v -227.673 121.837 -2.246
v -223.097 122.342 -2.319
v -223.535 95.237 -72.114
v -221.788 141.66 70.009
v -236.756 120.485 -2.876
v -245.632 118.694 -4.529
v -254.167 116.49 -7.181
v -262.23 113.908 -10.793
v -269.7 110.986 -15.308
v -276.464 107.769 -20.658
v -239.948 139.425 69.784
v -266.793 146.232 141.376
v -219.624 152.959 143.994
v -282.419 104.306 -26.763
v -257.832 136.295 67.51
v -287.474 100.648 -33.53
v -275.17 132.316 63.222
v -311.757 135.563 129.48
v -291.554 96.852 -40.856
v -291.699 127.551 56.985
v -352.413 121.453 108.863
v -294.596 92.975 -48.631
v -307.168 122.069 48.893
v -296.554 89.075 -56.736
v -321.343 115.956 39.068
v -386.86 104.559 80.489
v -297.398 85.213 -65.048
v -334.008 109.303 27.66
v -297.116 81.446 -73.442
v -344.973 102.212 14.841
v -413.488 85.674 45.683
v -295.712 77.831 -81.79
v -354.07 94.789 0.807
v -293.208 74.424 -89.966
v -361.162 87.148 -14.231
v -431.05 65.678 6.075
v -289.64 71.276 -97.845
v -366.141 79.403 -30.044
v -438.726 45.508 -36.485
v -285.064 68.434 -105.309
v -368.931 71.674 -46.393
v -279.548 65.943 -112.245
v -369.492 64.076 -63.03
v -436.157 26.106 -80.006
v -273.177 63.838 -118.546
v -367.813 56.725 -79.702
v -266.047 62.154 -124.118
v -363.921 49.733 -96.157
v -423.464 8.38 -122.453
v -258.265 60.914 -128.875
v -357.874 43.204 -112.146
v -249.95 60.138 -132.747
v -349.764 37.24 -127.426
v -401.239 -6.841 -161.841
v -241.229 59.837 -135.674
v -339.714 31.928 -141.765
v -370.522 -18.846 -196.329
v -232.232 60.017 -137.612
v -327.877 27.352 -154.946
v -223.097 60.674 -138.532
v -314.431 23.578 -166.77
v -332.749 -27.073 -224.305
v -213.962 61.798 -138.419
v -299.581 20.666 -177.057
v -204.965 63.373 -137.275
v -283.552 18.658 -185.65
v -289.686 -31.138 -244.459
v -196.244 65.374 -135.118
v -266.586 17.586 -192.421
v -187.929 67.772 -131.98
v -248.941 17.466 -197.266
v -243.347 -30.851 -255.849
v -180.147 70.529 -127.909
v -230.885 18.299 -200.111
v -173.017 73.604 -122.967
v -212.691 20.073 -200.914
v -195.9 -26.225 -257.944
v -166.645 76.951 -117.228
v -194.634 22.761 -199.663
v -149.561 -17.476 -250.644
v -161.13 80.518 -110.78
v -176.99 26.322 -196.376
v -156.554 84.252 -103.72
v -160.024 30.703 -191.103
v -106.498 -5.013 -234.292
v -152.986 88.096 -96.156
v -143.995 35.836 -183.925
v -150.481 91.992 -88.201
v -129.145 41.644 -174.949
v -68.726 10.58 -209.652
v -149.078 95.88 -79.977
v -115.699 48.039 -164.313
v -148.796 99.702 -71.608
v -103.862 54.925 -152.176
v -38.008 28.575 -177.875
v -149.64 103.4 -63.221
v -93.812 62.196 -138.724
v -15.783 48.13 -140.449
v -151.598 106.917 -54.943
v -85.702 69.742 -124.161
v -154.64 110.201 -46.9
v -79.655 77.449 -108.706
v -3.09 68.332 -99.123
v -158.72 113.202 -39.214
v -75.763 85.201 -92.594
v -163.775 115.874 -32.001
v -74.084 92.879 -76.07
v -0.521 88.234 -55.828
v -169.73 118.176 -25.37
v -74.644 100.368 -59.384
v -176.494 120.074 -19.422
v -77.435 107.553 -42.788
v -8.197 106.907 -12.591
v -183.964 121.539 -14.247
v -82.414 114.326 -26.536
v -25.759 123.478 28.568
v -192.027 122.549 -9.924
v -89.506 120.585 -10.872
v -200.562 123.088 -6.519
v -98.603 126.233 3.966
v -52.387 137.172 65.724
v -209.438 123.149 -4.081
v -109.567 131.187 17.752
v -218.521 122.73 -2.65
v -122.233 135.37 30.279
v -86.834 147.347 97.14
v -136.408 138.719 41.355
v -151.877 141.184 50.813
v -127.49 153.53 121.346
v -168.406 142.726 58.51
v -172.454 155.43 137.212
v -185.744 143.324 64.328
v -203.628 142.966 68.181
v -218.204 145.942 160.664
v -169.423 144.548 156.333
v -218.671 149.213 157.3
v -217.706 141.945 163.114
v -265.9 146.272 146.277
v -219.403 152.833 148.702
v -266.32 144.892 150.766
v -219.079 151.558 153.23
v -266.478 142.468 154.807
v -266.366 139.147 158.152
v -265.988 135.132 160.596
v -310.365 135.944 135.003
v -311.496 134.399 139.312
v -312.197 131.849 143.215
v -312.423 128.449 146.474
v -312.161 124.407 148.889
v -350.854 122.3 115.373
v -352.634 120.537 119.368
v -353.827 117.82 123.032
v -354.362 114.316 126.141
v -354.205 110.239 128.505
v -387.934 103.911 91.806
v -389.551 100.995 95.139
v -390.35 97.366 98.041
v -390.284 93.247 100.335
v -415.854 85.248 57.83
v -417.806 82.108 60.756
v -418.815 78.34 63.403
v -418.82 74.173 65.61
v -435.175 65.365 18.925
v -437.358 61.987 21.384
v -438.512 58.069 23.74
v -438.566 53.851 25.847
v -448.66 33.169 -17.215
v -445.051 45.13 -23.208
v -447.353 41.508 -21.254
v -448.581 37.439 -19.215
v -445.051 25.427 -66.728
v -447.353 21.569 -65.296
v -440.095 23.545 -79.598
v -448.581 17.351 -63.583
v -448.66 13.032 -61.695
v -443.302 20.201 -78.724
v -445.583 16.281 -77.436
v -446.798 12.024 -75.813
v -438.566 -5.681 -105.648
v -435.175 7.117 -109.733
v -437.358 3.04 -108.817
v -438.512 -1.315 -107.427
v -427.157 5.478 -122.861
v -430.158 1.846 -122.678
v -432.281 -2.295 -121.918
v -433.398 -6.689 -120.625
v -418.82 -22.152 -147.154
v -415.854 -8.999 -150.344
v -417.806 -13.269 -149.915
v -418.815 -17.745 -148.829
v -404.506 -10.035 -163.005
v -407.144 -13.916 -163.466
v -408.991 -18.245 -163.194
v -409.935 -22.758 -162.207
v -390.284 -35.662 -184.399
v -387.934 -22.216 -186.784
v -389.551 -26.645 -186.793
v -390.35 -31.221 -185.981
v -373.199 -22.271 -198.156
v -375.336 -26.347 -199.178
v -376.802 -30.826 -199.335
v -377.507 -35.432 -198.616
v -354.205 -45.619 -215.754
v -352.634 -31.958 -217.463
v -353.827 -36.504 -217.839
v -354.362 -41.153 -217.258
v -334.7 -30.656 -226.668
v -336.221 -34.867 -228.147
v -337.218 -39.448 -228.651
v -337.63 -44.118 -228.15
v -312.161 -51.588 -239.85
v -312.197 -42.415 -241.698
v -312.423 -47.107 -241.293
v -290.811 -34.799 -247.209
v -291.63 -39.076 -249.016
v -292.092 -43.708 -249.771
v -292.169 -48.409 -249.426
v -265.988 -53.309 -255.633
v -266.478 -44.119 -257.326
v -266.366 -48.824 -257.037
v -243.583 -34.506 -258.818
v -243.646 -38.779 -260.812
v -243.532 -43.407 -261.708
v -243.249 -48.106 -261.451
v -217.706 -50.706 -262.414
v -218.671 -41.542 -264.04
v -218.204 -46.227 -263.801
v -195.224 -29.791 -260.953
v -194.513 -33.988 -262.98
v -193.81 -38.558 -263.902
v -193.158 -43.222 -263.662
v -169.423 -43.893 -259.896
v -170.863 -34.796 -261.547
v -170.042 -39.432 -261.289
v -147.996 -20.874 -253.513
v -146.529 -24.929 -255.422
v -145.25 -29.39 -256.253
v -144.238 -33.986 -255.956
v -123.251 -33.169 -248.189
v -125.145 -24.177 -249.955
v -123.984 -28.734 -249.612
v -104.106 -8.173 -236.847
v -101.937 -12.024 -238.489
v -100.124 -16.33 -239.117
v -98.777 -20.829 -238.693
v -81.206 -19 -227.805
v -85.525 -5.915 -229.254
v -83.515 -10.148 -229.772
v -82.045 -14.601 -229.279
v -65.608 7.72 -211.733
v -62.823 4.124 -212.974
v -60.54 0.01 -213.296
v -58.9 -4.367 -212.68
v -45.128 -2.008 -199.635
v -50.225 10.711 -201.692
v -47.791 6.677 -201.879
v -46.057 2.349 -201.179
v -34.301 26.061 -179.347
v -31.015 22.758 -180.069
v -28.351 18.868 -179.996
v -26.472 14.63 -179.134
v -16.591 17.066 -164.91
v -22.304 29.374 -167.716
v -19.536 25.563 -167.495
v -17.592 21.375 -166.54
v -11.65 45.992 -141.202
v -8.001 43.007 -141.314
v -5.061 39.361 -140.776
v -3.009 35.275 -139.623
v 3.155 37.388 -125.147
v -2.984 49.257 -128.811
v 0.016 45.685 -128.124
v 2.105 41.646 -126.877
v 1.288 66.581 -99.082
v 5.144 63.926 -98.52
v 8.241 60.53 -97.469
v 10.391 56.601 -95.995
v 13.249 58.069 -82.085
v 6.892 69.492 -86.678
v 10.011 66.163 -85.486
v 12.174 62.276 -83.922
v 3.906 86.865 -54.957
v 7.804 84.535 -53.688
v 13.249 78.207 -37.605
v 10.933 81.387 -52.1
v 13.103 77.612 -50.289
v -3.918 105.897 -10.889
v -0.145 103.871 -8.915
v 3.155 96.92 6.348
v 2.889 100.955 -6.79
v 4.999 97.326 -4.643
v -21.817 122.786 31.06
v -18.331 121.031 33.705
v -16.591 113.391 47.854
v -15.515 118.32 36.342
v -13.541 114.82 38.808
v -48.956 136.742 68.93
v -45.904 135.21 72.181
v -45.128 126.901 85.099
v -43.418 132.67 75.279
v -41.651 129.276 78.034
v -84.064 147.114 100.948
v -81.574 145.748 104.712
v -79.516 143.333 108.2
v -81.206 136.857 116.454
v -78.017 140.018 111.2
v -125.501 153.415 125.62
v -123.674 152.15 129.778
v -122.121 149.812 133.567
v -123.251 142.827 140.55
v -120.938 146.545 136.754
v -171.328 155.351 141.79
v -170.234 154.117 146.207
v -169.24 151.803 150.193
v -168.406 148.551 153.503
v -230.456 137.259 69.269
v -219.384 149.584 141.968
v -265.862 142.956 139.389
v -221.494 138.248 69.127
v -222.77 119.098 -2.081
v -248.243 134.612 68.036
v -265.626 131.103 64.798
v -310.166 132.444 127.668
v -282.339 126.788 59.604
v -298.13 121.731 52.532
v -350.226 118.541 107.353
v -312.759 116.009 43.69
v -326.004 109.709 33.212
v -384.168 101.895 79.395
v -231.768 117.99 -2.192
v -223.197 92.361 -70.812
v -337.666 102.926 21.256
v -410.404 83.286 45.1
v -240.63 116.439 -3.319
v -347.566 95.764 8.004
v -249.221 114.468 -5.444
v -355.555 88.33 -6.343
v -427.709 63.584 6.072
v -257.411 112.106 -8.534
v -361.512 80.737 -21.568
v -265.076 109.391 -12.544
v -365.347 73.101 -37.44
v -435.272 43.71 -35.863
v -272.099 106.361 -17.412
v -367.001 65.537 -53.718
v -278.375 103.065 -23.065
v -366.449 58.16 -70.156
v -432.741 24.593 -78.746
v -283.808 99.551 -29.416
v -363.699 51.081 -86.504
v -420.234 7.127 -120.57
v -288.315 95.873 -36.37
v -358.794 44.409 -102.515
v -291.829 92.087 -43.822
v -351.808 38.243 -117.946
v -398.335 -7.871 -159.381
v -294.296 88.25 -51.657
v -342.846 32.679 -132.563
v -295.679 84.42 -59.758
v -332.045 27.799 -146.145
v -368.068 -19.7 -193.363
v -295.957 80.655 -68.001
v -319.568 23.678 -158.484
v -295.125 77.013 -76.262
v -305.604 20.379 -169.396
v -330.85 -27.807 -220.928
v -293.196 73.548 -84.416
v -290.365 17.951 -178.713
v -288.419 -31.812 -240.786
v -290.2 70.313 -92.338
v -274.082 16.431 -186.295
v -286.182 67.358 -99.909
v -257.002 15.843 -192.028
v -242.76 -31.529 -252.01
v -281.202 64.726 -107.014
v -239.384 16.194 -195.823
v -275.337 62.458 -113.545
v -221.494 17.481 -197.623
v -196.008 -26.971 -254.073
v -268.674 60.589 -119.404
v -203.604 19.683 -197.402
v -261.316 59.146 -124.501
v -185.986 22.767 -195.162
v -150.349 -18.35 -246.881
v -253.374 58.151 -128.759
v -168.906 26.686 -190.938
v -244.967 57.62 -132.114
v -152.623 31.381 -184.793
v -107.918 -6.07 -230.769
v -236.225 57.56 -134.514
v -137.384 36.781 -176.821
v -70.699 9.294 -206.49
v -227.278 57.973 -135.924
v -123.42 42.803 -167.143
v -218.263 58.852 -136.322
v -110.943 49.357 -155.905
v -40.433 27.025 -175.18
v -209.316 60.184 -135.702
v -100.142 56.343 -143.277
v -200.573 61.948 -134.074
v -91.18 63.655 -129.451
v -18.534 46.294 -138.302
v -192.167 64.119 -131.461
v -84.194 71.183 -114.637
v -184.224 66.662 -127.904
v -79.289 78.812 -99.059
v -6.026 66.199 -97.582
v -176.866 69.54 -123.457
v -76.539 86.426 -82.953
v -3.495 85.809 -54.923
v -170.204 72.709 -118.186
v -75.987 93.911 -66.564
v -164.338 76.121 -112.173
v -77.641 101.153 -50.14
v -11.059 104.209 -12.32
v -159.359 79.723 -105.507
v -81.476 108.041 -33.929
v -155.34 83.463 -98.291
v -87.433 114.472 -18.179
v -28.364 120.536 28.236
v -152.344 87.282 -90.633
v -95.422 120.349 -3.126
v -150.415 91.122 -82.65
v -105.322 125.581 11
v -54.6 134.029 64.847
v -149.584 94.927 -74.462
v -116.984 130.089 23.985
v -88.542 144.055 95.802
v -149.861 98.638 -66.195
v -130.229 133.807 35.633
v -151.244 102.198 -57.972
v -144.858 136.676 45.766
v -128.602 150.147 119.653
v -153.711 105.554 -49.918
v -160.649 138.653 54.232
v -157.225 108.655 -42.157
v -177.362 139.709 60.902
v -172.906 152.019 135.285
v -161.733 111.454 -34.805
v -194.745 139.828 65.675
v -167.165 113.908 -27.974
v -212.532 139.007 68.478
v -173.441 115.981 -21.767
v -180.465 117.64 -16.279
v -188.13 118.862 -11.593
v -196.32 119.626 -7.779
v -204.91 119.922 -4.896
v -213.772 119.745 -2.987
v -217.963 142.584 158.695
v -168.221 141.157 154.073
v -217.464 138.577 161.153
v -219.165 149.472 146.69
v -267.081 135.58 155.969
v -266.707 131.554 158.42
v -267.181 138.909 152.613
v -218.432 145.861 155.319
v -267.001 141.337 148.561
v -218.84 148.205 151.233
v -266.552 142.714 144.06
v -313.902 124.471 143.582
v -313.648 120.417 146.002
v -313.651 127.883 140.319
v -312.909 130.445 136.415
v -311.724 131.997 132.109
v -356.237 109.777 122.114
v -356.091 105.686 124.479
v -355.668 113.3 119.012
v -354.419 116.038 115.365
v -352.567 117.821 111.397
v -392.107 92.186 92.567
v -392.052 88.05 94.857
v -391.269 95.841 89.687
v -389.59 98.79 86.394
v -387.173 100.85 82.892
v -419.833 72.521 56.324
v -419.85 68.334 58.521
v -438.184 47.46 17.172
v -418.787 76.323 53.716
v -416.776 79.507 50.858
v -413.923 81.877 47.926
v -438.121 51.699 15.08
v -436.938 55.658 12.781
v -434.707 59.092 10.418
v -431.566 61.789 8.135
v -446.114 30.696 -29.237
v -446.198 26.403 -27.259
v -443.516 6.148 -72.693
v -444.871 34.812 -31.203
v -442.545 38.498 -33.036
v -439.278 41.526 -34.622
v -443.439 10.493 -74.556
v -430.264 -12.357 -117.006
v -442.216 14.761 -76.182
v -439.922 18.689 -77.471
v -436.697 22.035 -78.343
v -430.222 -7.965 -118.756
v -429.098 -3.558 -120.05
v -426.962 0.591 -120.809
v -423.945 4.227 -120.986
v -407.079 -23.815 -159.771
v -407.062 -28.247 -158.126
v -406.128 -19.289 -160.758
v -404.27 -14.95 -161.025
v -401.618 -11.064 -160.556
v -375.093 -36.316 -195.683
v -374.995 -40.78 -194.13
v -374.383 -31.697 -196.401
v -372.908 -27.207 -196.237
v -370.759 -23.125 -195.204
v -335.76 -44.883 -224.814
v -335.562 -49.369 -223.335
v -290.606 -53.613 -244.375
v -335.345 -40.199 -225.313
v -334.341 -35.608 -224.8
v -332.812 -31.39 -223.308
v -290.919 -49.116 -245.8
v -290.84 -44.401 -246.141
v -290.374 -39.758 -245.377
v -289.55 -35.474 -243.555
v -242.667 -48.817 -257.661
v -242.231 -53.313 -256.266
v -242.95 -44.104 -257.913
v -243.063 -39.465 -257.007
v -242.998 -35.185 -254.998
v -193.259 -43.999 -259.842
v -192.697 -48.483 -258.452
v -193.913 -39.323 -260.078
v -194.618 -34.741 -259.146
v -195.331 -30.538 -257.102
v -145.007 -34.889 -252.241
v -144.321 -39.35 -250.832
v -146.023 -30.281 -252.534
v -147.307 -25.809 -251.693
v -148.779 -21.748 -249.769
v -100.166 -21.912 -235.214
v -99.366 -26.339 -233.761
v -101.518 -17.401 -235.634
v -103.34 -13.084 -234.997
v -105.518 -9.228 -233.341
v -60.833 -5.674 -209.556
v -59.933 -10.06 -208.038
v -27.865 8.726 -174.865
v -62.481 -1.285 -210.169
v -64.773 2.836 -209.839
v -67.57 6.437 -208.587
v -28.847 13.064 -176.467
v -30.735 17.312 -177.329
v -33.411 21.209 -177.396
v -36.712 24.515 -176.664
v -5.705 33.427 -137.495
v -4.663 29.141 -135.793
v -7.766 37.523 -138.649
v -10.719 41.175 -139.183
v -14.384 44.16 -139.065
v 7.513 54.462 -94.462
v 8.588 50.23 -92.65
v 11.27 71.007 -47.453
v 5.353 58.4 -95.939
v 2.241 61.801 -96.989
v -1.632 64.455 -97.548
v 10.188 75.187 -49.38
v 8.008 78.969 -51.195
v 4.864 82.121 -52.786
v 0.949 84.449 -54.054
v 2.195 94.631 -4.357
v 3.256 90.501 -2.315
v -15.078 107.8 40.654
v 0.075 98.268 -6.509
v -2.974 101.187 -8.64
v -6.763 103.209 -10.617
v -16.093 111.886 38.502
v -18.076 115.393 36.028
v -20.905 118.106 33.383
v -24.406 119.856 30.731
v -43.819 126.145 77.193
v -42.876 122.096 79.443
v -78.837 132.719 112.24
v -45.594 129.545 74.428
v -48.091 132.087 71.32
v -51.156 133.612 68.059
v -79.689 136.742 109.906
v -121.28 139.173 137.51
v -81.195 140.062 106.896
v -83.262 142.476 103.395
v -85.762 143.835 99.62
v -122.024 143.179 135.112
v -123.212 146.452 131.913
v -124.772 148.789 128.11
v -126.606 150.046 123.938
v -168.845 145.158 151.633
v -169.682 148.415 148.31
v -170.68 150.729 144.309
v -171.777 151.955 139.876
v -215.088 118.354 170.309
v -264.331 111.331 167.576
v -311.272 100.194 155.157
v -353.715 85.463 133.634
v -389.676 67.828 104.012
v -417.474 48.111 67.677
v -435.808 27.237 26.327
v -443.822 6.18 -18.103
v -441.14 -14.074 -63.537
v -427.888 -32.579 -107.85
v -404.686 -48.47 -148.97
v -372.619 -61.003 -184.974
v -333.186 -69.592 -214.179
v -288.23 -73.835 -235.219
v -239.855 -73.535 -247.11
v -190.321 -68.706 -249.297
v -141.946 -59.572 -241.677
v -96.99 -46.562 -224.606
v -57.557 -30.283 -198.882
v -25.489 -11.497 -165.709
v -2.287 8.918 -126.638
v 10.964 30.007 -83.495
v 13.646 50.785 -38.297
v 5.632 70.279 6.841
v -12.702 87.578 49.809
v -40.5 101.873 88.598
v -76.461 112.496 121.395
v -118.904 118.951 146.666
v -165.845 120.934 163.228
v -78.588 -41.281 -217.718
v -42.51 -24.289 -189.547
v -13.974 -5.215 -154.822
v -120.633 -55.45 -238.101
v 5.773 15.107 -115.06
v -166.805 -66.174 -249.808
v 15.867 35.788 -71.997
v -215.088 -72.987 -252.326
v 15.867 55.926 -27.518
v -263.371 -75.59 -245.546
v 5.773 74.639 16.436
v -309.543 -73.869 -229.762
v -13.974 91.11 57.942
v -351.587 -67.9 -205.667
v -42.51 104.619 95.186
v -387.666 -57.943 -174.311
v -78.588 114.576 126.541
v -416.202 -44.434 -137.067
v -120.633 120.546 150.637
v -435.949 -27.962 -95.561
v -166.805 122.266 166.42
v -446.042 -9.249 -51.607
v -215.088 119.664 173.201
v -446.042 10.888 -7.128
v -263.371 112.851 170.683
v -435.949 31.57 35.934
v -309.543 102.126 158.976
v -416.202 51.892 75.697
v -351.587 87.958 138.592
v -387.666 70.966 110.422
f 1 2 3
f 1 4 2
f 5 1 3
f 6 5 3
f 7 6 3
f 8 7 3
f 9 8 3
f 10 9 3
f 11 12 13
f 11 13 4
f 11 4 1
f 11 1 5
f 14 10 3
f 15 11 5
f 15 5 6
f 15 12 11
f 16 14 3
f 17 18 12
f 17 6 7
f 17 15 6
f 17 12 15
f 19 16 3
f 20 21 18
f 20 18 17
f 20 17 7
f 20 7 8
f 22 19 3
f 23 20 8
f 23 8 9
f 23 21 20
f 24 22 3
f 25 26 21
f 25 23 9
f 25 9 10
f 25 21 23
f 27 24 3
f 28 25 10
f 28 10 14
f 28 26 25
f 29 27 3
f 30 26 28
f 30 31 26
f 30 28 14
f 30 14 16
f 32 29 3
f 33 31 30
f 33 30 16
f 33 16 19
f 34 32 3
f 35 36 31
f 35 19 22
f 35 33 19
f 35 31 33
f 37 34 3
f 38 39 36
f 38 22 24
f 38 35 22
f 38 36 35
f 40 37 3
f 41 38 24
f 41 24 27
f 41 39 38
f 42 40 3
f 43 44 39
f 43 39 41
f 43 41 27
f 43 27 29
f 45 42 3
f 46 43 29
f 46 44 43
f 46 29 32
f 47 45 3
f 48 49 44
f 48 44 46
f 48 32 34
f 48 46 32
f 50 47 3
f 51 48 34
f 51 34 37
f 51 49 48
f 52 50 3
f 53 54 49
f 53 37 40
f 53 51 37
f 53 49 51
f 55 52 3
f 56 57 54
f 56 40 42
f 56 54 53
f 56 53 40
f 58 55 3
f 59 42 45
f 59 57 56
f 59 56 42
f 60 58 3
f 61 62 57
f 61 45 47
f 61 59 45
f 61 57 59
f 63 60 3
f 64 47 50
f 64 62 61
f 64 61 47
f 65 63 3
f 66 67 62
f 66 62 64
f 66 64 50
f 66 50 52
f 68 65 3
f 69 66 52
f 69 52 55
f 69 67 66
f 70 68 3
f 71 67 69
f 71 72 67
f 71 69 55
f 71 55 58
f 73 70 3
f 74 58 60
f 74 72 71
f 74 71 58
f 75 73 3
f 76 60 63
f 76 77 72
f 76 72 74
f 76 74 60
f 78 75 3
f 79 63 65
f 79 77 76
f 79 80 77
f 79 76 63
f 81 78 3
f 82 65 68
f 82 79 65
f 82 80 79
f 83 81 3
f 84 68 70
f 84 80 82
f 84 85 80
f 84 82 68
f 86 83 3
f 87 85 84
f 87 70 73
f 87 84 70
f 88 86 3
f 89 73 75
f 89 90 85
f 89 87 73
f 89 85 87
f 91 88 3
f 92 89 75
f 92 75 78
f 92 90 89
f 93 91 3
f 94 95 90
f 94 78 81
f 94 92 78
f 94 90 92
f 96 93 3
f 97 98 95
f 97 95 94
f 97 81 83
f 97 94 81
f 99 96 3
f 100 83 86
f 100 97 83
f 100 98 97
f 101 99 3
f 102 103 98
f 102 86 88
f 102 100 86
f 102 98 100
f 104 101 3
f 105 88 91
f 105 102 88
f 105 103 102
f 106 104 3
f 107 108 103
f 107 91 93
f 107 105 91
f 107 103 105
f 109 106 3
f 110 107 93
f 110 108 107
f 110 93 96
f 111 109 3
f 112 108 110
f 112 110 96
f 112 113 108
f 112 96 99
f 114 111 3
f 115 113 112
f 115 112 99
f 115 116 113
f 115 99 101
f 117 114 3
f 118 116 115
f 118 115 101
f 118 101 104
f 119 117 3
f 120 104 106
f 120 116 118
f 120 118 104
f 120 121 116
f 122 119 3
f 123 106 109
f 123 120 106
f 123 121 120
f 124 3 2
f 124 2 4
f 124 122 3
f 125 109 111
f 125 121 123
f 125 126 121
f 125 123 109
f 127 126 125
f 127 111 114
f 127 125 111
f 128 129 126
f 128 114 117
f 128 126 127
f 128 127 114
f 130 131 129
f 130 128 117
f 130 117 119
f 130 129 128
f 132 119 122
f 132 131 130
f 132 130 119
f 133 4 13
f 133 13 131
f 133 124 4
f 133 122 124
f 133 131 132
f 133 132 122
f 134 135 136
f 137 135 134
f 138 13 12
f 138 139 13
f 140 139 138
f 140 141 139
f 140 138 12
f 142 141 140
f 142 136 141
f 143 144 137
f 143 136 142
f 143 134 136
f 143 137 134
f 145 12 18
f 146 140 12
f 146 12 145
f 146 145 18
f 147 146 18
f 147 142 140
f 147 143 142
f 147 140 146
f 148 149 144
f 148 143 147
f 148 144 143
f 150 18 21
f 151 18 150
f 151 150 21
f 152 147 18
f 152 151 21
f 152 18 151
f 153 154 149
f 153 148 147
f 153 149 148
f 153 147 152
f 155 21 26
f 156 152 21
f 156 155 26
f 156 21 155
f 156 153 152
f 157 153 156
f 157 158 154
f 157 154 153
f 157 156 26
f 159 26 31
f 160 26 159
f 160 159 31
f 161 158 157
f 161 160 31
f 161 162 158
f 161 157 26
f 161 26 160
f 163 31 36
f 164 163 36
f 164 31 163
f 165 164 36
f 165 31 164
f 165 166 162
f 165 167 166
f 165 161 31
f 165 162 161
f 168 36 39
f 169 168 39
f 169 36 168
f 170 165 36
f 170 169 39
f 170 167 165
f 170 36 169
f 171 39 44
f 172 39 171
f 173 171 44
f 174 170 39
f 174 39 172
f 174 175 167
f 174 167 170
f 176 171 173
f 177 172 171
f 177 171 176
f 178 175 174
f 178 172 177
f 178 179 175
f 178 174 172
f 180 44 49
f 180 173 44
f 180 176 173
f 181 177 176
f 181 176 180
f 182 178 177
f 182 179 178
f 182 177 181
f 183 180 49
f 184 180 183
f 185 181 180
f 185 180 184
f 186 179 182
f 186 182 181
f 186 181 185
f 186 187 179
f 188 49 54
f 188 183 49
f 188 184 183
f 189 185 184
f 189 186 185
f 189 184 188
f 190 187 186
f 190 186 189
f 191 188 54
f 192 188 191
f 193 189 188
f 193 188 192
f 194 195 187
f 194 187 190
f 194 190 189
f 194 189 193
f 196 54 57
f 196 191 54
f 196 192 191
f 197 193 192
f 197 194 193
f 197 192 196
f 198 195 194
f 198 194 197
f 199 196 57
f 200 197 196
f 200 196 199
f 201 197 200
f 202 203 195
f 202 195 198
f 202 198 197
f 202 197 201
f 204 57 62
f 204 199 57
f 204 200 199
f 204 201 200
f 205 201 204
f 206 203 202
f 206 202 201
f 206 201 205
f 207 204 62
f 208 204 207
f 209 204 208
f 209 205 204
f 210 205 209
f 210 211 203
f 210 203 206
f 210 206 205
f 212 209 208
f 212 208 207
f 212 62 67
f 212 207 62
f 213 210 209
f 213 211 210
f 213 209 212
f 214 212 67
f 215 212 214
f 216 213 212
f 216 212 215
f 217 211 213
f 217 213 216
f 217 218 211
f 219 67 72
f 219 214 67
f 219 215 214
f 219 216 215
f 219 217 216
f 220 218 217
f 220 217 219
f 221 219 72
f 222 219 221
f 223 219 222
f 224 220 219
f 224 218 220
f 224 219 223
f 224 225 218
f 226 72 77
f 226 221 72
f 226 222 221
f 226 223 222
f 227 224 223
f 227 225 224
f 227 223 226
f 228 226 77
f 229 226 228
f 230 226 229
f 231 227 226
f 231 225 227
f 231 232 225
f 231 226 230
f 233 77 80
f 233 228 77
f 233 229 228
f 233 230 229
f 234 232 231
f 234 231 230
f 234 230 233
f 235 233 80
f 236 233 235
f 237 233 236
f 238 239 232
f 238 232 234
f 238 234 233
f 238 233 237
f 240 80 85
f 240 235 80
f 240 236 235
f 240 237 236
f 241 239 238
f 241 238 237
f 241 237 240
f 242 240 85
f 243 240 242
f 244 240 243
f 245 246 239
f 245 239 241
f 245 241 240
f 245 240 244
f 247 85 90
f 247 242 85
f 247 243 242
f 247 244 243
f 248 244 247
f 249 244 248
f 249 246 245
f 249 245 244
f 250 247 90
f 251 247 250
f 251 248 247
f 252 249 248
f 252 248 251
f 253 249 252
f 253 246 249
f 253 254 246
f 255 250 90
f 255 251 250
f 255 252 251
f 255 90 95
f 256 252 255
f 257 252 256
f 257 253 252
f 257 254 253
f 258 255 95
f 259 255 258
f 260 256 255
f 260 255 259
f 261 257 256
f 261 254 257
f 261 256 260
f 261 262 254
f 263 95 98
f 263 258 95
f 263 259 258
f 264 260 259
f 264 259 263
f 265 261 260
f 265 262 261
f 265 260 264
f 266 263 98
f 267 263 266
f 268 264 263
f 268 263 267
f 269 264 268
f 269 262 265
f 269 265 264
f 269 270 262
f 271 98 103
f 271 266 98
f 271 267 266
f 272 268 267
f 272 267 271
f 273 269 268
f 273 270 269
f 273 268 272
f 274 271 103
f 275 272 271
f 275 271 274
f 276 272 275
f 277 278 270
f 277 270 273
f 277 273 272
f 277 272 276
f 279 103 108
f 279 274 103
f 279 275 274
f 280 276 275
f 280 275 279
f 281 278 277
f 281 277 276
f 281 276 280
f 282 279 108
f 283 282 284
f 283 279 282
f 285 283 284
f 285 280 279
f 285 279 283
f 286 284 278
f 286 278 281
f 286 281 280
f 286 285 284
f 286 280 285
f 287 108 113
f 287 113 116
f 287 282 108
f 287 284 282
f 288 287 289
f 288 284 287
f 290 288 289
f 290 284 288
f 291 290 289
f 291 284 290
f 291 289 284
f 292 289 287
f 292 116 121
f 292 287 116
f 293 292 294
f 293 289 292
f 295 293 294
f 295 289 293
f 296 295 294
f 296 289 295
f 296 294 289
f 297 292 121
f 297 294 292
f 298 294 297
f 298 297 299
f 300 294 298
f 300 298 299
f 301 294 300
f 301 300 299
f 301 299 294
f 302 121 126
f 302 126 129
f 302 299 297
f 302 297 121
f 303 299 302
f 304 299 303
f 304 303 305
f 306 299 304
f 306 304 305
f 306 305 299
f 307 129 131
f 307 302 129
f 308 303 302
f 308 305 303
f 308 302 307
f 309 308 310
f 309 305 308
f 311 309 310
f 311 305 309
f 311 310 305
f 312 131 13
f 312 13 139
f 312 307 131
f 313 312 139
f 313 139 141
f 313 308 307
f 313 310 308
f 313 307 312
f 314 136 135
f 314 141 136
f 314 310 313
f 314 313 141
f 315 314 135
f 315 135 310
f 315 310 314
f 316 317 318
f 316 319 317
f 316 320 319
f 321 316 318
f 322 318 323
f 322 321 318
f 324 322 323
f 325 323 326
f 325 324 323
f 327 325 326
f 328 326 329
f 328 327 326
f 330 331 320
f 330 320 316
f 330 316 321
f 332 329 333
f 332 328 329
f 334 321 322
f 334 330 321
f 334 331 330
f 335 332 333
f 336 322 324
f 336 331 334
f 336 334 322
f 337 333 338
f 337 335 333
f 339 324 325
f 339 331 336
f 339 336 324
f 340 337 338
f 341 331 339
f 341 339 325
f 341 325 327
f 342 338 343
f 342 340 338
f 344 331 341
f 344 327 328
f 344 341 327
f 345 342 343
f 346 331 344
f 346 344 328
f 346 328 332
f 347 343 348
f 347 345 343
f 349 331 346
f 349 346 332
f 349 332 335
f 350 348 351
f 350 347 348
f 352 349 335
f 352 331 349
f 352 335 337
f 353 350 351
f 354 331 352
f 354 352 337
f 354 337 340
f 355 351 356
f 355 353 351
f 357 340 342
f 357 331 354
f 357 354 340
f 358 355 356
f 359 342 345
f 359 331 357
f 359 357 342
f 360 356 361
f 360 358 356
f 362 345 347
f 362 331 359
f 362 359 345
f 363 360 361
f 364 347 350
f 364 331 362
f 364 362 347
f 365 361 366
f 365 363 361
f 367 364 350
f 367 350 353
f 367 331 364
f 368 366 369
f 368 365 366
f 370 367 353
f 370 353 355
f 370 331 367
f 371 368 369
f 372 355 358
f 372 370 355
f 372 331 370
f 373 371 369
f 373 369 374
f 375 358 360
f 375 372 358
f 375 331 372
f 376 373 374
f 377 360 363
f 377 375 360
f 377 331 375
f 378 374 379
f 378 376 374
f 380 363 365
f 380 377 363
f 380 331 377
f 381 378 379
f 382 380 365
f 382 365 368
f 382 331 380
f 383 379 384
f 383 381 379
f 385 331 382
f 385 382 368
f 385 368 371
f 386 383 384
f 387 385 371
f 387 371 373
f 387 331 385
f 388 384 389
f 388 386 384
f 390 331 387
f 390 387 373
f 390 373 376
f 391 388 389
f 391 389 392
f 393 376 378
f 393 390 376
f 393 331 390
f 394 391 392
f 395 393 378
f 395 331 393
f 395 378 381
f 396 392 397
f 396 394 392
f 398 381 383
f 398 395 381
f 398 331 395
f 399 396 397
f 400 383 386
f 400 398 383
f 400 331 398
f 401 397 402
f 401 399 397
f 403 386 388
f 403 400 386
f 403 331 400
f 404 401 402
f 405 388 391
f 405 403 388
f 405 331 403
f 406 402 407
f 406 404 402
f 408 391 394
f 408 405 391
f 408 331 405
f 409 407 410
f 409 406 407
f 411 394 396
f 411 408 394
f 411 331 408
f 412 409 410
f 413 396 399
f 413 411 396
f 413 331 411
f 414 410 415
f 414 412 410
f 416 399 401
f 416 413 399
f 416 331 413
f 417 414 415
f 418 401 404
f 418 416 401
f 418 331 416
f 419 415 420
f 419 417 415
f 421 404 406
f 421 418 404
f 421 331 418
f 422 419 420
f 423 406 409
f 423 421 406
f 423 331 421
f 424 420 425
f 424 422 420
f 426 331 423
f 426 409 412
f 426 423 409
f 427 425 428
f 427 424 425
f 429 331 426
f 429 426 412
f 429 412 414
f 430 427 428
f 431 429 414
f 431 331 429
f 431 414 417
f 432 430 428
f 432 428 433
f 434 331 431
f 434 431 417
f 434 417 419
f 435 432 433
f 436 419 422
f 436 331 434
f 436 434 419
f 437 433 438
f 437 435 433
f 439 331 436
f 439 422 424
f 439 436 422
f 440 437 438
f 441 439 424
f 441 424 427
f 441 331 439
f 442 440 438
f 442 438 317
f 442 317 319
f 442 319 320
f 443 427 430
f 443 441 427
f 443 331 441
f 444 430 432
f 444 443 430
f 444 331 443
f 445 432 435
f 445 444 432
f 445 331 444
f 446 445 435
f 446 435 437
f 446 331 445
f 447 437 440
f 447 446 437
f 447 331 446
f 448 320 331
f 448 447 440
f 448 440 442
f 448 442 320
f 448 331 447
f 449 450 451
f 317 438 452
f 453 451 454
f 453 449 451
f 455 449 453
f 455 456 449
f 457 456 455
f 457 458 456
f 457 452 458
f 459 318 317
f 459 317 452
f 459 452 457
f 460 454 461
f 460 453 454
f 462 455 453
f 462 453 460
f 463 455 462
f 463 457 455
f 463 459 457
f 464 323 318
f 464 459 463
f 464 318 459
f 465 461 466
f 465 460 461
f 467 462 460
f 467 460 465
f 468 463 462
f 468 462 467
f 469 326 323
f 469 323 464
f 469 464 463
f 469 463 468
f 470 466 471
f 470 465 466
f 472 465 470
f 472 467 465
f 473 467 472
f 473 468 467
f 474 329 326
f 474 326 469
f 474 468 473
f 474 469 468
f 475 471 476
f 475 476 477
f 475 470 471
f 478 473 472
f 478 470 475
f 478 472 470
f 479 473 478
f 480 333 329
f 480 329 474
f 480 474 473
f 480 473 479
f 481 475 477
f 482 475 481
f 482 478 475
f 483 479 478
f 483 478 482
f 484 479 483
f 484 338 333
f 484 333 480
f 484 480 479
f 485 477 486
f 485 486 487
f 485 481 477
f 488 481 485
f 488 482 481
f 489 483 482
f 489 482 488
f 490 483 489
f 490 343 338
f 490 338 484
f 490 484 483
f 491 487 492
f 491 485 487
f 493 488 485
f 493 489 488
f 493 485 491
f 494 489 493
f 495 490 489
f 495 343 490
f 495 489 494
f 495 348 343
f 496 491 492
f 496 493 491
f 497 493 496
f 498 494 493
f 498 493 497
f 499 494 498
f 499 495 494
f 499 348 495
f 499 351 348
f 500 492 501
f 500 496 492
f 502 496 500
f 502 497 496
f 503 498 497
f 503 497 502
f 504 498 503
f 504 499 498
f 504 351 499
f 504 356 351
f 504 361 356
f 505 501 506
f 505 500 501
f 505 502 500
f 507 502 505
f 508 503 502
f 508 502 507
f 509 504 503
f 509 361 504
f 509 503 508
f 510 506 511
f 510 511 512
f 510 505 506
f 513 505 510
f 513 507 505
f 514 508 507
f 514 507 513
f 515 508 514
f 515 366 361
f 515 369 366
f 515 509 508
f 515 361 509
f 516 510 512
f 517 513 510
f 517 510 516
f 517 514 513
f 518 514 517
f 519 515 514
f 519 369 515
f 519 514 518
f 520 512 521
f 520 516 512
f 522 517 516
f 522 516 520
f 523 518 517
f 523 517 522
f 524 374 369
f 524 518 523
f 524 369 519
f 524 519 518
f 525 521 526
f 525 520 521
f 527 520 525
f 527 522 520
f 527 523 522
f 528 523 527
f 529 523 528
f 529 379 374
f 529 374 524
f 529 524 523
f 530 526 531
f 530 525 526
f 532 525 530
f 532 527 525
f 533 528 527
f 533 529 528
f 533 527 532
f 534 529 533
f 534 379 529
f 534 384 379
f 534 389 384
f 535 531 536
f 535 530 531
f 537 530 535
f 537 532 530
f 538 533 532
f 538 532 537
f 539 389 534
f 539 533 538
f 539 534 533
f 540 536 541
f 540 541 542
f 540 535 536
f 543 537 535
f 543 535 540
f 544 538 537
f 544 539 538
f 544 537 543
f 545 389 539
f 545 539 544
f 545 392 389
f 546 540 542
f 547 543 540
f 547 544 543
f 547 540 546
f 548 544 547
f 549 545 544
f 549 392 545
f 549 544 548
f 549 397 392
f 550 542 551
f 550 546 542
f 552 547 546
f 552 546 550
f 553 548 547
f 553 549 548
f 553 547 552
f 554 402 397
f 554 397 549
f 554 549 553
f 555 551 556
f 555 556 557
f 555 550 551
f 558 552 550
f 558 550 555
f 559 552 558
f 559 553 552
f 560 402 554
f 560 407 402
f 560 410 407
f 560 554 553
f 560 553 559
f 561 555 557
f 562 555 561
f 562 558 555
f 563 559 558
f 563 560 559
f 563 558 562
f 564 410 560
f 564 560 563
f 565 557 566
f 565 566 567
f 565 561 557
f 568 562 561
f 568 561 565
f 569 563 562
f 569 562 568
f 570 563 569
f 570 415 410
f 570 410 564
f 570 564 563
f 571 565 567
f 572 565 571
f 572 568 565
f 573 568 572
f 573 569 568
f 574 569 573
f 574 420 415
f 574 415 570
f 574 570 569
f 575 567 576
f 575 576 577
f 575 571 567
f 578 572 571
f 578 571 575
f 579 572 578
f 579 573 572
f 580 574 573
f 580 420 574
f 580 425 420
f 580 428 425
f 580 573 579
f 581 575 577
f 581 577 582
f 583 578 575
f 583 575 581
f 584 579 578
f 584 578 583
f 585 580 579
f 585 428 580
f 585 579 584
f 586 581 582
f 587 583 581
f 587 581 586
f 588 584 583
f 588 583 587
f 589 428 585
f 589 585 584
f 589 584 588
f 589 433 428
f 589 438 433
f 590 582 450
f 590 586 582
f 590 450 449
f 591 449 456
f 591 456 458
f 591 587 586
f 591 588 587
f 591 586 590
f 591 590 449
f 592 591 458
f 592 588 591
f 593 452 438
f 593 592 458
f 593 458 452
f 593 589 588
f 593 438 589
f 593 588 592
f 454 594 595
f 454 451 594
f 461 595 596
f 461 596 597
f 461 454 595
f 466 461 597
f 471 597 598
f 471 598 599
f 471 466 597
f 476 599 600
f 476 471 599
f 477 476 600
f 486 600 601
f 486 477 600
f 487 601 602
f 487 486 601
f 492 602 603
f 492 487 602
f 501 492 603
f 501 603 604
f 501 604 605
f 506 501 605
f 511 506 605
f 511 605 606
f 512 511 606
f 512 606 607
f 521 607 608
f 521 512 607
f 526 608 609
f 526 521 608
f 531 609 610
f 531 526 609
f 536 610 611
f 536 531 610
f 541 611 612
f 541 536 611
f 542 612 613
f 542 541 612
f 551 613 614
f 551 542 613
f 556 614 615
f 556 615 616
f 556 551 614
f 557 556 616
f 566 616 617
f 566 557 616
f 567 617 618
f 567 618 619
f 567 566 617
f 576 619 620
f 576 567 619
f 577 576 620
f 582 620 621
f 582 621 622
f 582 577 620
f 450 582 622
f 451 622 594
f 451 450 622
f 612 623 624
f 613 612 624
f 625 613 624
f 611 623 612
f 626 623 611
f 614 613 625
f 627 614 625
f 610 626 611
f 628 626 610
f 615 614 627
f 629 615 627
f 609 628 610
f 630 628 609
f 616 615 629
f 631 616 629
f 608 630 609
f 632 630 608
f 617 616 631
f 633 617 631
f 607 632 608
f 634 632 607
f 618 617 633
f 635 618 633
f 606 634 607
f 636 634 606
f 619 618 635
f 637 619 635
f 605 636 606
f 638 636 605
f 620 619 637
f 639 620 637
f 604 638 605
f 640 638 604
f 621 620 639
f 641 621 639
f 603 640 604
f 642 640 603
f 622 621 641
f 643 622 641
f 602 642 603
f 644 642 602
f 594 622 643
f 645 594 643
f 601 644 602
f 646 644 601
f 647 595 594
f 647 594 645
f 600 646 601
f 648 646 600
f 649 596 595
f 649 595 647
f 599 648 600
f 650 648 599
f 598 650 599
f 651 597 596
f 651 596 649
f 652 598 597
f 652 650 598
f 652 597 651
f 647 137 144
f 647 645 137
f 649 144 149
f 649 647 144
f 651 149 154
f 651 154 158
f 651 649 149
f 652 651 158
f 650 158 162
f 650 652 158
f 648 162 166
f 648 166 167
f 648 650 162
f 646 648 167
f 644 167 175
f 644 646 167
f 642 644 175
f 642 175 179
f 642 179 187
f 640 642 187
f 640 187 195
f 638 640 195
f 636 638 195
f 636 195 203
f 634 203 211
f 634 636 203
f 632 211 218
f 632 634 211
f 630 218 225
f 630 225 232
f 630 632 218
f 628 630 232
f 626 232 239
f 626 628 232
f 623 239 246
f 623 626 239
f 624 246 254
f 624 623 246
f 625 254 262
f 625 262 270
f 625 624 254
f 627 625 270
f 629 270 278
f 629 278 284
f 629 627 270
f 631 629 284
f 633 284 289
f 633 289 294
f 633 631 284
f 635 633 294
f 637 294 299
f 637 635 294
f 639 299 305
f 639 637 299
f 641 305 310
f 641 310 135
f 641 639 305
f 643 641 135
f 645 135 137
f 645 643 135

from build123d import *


with BuildPart() as part:
    # Sketch1 → Revolve1 (revolve)
    with BuildSketch(Plane(origin=(-170.126510157, -378.462559963, 173.892254674), x_dir=(-0.12417271401547268, 0.39709903879718633, 0.9093368410442757), z_dir=(-0.9865371296335288, -0.1476957156883053, -0.07021728720021364))):
        with BuildLine():
            Line((201.413414743, 456.277858032), (201.413414743, 478.603217986))
            ThreePointArc((201.413414743, 478.603217986), (197.844782275, 489.70410801), (188.475907203, 496.645943277))
            ThreePointArc((188.475907203, 496.645943277), (81.221954161, 523.459876529), (-28.964585257, 532.477858032))
            Line((-28.964585257, 532.477858032), (-28.964585257, 535.652858032))
            ThreePointArc((-28.964585257, 535.652858032), (82.894207472, 526.401105506), (191.712975822, 498.897285948))
            ThreePointArc((191.712975822, 498.897285948), (201.038864552, 491.949936692), (204.588414743, 480.875707341))
            Line((204.588414743, 480.875707341), (204.588414743, 456.277858032))
            Line((204.588414743, 456.277858032), (201.413414743, 456.277858032))
        make_face()
    revolve(axis=Axis((-223.535114395, 95.237289839, -72.113649338), (0.10642193828561908, -0.9058136281563032, 0.410092723780667)))


solid = part.part
